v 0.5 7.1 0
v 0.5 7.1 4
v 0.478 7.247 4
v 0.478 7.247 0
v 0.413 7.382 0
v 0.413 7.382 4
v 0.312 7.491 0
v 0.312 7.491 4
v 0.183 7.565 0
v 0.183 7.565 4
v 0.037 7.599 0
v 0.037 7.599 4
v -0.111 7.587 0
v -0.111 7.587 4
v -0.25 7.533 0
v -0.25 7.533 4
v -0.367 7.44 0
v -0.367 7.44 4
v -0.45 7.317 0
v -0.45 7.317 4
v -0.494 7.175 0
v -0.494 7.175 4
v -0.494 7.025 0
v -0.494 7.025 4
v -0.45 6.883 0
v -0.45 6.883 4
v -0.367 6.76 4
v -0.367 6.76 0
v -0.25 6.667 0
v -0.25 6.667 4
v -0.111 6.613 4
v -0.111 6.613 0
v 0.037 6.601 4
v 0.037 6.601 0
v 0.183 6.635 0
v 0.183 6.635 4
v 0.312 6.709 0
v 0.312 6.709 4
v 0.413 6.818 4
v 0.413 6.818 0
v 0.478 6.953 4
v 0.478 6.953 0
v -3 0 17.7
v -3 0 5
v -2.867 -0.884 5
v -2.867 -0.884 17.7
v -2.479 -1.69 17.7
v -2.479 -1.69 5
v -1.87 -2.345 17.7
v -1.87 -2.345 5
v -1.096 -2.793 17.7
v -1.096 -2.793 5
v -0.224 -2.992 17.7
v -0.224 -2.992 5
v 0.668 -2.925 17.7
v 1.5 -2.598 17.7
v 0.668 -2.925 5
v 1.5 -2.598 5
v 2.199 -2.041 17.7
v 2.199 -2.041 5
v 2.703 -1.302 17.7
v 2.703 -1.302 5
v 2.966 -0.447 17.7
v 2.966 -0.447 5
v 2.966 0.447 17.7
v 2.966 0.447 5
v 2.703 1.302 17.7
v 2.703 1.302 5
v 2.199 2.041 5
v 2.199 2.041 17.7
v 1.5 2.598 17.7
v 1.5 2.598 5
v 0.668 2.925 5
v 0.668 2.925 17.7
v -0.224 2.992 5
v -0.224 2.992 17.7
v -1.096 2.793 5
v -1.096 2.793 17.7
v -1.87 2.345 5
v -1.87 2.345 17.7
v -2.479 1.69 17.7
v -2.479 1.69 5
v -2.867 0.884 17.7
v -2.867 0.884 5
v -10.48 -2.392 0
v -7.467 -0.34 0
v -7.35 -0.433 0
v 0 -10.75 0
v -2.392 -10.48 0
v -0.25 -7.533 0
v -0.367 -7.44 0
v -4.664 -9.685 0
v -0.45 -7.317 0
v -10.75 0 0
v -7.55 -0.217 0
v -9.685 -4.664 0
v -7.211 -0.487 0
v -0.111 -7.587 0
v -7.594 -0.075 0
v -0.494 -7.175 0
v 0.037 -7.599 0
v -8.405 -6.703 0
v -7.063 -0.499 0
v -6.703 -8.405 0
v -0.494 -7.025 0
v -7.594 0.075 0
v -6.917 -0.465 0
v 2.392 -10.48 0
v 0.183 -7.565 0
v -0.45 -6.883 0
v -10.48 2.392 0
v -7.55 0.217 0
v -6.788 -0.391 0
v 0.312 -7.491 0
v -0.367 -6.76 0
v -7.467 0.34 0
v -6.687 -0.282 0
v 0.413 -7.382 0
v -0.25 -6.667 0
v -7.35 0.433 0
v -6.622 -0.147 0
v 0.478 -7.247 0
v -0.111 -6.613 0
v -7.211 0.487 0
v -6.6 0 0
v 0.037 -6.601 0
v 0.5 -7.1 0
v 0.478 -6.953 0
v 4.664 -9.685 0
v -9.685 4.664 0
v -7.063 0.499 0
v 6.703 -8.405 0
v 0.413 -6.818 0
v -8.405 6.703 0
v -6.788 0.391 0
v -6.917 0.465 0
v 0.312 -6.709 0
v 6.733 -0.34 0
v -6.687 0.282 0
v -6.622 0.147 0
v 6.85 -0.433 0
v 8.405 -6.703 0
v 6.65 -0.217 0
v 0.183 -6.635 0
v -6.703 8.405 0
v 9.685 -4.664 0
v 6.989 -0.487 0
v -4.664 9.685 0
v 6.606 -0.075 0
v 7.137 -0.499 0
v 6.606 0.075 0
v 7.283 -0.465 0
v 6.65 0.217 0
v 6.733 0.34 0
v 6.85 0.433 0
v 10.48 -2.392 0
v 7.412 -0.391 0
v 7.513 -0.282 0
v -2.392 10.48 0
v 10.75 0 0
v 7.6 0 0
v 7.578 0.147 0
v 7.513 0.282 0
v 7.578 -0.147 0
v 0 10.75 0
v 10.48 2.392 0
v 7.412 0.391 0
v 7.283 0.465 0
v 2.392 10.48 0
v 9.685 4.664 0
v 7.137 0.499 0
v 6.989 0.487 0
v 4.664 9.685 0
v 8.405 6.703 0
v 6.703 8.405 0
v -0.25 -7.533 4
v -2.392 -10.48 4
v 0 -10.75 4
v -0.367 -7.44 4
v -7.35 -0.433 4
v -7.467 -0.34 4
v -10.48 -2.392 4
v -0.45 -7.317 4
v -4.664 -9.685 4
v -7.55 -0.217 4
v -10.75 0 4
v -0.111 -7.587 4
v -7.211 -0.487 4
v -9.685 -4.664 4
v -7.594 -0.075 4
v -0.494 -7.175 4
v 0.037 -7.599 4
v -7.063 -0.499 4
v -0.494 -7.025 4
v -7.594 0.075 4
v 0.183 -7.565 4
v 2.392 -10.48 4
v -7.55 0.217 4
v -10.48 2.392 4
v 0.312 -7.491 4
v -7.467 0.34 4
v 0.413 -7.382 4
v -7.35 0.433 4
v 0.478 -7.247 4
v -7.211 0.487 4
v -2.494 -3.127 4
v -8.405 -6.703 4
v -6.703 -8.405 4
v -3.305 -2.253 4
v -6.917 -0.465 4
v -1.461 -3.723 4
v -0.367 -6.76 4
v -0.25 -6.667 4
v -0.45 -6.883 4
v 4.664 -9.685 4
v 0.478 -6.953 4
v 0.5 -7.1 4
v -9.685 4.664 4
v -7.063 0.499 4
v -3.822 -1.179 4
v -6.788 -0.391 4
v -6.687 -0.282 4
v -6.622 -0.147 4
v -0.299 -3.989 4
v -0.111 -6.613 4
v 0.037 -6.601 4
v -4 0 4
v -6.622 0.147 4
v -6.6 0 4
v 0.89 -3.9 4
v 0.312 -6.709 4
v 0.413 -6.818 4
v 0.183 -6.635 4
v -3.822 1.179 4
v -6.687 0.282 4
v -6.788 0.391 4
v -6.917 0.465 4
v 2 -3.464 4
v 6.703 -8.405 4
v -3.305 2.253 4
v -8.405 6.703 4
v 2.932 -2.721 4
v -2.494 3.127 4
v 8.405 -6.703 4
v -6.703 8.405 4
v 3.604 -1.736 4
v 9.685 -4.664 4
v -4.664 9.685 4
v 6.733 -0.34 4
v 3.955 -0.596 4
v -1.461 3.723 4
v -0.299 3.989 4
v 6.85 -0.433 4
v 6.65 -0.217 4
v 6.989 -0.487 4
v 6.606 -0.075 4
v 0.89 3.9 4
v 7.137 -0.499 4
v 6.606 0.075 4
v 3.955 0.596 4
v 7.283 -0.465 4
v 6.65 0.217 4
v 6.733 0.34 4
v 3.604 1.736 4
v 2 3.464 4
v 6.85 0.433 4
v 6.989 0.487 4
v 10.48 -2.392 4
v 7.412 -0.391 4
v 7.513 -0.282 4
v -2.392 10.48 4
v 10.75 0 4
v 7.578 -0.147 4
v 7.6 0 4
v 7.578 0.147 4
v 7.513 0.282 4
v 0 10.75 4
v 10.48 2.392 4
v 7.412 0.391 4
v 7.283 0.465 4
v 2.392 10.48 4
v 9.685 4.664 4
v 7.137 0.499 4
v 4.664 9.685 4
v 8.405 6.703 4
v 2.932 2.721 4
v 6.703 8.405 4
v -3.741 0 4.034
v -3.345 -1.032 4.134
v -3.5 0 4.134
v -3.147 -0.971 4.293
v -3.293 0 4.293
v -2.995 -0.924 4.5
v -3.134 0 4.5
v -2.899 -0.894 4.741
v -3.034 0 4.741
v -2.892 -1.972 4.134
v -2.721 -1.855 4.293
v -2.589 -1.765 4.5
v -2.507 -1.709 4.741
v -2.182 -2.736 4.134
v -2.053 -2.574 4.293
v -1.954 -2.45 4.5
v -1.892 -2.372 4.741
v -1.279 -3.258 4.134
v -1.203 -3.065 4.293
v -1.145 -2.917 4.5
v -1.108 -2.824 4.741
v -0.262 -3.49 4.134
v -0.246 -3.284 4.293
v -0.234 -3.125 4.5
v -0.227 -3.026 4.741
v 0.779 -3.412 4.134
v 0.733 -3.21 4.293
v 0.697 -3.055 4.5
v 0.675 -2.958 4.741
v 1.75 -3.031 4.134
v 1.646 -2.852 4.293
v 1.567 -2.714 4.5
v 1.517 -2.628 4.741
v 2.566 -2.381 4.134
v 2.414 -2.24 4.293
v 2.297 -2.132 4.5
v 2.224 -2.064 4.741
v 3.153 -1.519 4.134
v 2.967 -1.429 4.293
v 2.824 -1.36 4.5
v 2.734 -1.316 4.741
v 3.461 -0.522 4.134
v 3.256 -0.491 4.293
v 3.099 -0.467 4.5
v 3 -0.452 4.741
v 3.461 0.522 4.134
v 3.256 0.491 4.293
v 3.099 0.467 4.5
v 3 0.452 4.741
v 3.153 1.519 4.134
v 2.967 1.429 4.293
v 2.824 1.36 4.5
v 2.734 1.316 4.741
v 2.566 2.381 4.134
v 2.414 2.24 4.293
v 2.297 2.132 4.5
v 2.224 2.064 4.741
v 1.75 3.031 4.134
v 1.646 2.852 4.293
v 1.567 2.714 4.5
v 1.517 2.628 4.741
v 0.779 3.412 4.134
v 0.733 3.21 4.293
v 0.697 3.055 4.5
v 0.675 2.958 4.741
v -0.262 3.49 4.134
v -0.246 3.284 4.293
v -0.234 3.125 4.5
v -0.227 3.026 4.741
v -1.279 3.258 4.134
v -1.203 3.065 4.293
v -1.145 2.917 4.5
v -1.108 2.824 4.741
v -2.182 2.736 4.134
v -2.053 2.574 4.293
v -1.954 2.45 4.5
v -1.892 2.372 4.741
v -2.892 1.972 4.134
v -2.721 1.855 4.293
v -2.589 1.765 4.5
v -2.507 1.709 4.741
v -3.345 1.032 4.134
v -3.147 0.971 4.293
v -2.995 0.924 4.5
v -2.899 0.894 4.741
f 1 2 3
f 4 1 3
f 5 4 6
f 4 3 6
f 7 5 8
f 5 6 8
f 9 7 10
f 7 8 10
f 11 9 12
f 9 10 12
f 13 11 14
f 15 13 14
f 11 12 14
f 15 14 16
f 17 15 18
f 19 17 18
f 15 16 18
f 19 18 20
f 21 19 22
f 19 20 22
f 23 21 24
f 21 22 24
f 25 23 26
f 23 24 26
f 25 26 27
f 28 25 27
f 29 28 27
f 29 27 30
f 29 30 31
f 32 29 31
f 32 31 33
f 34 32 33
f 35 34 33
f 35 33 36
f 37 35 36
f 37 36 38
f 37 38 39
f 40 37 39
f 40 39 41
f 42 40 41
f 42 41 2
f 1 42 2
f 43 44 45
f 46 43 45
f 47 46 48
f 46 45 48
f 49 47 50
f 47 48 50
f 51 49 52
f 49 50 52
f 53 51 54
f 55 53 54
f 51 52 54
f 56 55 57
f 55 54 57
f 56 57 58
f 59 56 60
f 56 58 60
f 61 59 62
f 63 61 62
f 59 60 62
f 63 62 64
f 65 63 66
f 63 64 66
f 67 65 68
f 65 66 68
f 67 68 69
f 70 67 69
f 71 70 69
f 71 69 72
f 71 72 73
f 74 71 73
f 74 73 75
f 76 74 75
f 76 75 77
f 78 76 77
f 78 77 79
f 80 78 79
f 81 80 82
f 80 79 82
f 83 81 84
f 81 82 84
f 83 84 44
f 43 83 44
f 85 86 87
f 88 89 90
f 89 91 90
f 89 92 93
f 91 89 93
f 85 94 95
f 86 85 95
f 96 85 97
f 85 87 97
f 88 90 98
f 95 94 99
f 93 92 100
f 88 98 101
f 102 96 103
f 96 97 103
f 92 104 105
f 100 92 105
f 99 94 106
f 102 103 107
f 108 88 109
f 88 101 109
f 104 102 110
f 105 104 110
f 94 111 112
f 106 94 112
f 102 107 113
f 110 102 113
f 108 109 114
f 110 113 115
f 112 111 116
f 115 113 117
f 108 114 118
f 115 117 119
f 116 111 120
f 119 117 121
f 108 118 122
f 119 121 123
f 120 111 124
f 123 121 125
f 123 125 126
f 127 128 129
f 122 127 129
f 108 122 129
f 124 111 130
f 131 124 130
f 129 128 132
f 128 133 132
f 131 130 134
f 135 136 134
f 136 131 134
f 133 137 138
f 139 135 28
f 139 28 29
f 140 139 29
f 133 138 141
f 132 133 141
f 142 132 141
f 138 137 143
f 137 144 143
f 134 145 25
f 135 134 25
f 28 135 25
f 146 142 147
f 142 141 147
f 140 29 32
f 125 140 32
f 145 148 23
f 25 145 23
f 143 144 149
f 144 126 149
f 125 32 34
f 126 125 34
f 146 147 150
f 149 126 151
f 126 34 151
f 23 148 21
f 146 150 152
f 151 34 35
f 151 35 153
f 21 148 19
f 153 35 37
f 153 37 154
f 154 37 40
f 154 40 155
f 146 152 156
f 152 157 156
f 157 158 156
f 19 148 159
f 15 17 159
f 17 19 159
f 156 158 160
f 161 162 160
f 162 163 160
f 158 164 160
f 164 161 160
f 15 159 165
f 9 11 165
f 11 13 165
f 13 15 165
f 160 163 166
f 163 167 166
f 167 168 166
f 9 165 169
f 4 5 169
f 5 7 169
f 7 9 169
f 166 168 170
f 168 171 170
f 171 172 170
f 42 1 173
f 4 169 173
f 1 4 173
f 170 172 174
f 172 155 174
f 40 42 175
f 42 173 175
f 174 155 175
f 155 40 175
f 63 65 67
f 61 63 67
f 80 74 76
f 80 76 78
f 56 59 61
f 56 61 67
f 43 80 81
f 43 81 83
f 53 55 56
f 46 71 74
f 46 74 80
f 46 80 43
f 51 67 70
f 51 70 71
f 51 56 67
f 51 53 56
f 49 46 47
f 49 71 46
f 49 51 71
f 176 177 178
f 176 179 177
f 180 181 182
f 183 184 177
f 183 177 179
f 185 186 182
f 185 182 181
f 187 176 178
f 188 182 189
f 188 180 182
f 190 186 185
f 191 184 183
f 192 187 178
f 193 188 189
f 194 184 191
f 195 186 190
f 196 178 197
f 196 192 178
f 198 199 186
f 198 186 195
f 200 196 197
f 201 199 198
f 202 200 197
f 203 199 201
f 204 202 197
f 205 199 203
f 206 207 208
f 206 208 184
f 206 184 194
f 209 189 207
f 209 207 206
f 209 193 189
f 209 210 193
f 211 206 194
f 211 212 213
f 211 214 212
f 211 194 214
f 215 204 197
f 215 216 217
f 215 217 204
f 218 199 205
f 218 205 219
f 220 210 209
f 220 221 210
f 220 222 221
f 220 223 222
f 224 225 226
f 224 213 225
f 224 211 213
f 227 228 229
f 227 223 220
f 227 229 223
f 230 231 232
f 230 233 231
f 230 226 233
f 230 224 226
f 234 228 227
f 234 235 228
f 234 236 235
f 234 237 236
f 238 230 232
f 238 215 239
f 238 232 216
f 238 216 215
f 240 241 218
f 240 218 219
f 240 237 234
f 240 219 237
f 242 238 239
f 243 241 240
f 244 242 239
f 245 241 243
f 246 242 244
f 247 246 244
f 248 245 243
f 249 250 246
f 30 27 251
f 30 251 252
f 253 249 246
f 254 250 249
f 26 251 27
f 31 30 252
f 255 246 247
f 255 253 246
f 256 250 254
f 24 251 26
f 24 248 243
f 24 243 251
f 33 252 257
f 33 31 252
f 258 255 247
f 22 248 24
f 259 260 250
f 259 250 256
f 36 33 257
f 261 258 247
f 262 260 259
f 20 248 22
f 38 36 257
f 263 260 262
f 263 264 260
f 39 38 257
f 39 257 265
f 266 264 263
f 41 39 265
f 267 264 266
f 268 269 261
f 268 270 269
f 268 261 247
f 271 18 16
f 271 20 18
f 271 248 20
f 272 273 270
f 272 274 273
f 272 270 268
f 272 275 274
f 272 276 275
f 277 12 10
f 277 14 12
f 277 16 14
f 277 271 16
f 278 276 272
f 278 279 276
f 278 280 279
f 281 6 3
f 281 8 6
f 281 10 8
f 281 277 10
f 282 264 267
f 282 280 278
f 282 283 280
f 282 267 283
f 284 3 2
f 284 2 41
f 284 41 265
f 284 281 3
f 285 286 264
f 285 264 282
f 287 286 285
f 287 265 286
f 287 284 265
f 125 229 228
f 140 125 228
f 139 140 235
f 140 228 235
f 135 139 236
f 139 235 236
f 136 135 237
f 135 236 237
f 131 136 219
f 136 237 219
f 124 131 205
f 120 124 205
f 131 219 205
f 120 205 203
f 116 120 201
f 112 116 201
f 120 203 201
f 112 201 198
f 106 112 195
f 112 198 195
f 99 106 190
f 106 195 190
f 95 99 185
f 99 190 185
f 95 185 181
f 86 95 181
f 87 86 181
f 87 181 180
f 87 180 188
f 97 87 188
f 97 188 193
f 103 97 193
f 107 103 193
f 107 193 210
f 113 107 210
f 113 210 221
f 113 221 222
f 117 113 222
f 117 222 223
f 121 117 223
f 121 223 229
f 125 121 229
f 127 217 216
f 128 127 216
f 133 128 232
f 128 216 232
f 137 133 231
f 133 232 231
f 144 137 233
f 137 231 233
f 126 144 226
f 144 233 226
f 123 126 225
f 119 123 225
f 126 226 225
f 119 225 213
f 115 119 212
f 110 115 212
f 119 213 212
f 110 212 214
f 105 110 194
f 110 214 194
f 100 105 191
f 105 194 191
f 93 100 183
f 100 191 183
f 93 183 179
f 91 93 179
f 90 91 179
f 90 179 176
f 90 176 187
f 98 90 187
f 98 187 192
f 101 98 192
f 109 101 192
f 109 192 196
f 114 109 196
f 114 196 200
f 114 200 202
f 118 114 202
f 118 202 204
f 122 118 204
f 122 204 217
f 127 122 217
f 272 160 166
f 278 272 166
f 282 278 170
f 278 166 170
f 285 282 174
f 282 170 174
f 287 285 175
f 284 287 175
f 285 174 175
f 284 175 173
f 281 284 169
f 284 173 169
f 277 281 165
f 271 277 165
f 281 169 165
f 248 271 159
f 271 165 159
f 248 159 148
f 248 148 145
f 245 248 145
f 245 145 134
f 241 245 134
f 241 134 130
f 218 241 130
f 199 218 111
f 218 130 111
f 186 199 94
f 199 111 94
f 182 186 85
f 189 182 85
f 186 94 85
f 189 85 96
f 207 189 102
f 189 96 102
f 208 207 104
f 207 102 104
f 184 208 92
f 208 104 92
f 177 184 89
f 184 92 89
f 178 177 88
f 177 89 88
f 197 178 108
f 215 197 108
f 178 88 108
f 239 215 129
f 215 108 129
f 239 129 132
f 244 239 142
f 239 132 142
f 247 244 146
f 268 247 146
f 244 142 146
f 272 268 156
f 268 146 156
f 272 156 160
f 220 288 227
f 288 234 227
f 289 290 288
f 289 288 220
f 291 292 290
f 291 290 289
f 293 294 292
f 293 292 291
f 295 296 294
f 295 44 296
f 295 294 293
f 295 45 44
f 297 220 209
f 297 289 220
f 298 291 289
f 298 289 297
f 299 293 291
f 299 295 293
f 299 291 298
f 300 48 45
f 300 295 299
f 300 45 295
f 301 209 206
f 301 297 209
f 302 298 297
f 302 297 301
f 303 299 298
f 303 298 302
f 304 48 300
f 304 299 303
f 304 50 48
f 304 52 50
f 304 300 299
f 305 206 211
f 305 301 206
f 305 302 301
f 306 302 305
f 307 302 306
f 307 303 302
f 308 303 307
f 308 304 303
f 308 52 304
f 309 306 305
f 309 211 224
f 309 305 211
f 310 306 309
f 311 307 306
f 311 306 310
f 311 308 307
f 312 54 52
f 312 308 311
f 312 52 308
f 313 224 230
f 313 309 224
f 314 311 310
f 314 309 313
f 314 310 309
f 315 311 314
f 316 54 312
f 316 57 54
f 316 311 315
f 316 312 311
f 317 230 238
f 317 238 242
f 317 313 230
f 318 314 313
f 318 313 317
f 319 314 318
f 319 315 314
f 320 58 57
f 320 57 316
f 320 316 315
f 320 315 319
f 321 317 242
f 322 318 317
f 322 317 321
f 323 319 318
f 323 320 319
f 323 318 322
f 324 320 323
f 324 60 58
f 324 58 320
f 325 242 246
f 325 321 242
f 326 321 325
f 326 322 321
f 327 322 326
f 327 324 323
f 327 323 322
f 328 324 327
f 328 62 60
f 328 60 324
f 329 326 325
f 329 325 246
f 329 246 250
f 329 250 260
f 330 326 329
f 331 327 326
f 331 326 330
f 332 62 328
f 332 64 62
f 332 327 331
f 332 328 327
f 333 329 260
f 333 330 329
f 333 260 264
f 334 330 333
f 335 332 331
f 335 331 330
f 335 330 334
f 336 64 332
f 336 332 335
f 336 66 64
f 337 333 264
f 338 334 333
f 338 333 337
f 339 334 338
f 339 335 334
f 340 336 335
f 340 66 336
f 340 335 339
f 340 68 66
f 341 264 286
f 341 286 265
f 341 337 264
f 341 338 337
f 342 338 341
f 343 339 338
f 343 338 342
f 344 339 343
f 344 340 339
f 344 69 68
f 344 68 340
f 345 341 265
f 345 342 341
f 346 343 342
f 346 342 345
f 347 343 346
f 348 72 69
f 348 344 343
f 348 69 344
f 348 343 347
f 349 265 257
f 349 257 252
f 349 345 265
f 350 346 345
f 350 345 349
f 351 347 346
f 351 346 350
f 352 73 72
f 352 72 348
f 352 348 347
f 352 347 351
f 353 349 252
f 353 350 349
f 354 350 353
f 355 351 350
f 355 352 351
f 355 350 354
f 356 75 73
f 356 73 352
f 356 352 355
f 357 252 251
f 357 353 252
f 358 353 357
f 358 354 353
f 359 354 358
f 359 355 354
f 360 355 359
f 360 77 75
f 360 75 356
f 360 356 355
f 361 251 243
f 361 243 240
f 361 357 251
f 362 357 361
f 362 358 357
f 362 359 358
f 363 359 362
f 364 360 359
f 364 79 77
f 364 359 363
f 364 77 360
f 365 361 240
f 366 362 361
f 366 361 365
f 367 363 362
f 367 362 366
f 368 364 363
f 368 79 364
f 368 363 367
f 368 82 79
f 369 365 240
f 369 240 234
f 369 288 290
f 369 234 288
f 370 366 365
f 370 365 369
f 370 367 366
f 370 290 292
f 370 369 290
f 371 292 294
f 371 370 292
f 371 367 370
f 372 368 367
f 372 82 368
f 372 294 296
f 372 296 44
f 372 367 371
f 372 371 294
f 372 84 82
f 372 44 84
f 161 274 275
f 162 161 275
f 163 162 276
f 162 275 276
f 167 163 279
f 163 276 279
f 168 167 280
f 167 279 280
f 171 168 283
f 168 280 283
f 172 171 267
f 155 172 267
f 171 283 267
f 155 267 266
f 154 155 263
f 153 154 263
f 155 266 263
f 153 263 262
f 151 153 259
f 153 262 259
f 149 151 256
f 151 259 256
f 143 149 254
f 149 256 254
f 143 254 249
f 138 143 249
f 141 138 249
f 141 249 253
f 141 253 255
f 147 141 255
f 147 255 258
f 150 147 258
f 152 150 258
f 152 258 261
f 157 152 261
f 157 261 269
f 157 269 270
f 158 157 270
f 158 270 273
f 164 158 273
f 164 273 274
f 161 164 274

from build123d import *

# Parameters (mm, degrees)
ESBO_O1_R                = 10.75
RESSALTO_EXTRUS_O1_DEPTH = 4
ESBO_O2_R                = 3
RESSALTO_EXTRUS_O2_DEPTH = 13.7
FILETE2_R                = 1
ESBO_O3_R                = 0.5
CORTE_EXTRUS_O1_DEPTH    = 21.464970071


with BuildPart() as part:
    # Esboço1 → Ressalto-extrusão1 (new body)
    with BuildSketch(Plane.XY):
        Circle(ESBO_O1_R)
    extrude(amount=RESSALTO_EXTRUS_O1_DEPTH)

    # Esboço2 → Ressalto-extrusão2 (add)
    with BuildSketch(Plane.XY.offset(4)):
        with Locations(Location((0, 0, 0), (0, 0, 180))):
            Circle(ESBO_O2_R)
    extrude(amount=RESSALTO_EXTRUS_O2_DEPTH)

    # Filete2
    filete2_edges = [part.edges().sort_by_distance(p)[0] for p in [
        (3, 0, 4),
    ]]
    fillet(filete2_edges, radius=FILETE2_R)

    # Esboço3 → Corte-extrusão1 (cut, through all)
    with BuildSketch(Plane.XY.offset(4)):
        with Locations((7.1, 0)):
            Circle(ESBO_O3_R)
        with Locations((-7.1, 0)):
            Circle(ESBO_O3_R)
        with Locations((0, 7.1)):
            Circle(ESBO_O3_R)
        with Locations((0, -7.1)):
            Circle(ESBO_O3_R)
    extrude(amount=-CORTE_EXTRUS_O1_DEPTH, mode=Mode.SUBTRACT)


solid = part.part
